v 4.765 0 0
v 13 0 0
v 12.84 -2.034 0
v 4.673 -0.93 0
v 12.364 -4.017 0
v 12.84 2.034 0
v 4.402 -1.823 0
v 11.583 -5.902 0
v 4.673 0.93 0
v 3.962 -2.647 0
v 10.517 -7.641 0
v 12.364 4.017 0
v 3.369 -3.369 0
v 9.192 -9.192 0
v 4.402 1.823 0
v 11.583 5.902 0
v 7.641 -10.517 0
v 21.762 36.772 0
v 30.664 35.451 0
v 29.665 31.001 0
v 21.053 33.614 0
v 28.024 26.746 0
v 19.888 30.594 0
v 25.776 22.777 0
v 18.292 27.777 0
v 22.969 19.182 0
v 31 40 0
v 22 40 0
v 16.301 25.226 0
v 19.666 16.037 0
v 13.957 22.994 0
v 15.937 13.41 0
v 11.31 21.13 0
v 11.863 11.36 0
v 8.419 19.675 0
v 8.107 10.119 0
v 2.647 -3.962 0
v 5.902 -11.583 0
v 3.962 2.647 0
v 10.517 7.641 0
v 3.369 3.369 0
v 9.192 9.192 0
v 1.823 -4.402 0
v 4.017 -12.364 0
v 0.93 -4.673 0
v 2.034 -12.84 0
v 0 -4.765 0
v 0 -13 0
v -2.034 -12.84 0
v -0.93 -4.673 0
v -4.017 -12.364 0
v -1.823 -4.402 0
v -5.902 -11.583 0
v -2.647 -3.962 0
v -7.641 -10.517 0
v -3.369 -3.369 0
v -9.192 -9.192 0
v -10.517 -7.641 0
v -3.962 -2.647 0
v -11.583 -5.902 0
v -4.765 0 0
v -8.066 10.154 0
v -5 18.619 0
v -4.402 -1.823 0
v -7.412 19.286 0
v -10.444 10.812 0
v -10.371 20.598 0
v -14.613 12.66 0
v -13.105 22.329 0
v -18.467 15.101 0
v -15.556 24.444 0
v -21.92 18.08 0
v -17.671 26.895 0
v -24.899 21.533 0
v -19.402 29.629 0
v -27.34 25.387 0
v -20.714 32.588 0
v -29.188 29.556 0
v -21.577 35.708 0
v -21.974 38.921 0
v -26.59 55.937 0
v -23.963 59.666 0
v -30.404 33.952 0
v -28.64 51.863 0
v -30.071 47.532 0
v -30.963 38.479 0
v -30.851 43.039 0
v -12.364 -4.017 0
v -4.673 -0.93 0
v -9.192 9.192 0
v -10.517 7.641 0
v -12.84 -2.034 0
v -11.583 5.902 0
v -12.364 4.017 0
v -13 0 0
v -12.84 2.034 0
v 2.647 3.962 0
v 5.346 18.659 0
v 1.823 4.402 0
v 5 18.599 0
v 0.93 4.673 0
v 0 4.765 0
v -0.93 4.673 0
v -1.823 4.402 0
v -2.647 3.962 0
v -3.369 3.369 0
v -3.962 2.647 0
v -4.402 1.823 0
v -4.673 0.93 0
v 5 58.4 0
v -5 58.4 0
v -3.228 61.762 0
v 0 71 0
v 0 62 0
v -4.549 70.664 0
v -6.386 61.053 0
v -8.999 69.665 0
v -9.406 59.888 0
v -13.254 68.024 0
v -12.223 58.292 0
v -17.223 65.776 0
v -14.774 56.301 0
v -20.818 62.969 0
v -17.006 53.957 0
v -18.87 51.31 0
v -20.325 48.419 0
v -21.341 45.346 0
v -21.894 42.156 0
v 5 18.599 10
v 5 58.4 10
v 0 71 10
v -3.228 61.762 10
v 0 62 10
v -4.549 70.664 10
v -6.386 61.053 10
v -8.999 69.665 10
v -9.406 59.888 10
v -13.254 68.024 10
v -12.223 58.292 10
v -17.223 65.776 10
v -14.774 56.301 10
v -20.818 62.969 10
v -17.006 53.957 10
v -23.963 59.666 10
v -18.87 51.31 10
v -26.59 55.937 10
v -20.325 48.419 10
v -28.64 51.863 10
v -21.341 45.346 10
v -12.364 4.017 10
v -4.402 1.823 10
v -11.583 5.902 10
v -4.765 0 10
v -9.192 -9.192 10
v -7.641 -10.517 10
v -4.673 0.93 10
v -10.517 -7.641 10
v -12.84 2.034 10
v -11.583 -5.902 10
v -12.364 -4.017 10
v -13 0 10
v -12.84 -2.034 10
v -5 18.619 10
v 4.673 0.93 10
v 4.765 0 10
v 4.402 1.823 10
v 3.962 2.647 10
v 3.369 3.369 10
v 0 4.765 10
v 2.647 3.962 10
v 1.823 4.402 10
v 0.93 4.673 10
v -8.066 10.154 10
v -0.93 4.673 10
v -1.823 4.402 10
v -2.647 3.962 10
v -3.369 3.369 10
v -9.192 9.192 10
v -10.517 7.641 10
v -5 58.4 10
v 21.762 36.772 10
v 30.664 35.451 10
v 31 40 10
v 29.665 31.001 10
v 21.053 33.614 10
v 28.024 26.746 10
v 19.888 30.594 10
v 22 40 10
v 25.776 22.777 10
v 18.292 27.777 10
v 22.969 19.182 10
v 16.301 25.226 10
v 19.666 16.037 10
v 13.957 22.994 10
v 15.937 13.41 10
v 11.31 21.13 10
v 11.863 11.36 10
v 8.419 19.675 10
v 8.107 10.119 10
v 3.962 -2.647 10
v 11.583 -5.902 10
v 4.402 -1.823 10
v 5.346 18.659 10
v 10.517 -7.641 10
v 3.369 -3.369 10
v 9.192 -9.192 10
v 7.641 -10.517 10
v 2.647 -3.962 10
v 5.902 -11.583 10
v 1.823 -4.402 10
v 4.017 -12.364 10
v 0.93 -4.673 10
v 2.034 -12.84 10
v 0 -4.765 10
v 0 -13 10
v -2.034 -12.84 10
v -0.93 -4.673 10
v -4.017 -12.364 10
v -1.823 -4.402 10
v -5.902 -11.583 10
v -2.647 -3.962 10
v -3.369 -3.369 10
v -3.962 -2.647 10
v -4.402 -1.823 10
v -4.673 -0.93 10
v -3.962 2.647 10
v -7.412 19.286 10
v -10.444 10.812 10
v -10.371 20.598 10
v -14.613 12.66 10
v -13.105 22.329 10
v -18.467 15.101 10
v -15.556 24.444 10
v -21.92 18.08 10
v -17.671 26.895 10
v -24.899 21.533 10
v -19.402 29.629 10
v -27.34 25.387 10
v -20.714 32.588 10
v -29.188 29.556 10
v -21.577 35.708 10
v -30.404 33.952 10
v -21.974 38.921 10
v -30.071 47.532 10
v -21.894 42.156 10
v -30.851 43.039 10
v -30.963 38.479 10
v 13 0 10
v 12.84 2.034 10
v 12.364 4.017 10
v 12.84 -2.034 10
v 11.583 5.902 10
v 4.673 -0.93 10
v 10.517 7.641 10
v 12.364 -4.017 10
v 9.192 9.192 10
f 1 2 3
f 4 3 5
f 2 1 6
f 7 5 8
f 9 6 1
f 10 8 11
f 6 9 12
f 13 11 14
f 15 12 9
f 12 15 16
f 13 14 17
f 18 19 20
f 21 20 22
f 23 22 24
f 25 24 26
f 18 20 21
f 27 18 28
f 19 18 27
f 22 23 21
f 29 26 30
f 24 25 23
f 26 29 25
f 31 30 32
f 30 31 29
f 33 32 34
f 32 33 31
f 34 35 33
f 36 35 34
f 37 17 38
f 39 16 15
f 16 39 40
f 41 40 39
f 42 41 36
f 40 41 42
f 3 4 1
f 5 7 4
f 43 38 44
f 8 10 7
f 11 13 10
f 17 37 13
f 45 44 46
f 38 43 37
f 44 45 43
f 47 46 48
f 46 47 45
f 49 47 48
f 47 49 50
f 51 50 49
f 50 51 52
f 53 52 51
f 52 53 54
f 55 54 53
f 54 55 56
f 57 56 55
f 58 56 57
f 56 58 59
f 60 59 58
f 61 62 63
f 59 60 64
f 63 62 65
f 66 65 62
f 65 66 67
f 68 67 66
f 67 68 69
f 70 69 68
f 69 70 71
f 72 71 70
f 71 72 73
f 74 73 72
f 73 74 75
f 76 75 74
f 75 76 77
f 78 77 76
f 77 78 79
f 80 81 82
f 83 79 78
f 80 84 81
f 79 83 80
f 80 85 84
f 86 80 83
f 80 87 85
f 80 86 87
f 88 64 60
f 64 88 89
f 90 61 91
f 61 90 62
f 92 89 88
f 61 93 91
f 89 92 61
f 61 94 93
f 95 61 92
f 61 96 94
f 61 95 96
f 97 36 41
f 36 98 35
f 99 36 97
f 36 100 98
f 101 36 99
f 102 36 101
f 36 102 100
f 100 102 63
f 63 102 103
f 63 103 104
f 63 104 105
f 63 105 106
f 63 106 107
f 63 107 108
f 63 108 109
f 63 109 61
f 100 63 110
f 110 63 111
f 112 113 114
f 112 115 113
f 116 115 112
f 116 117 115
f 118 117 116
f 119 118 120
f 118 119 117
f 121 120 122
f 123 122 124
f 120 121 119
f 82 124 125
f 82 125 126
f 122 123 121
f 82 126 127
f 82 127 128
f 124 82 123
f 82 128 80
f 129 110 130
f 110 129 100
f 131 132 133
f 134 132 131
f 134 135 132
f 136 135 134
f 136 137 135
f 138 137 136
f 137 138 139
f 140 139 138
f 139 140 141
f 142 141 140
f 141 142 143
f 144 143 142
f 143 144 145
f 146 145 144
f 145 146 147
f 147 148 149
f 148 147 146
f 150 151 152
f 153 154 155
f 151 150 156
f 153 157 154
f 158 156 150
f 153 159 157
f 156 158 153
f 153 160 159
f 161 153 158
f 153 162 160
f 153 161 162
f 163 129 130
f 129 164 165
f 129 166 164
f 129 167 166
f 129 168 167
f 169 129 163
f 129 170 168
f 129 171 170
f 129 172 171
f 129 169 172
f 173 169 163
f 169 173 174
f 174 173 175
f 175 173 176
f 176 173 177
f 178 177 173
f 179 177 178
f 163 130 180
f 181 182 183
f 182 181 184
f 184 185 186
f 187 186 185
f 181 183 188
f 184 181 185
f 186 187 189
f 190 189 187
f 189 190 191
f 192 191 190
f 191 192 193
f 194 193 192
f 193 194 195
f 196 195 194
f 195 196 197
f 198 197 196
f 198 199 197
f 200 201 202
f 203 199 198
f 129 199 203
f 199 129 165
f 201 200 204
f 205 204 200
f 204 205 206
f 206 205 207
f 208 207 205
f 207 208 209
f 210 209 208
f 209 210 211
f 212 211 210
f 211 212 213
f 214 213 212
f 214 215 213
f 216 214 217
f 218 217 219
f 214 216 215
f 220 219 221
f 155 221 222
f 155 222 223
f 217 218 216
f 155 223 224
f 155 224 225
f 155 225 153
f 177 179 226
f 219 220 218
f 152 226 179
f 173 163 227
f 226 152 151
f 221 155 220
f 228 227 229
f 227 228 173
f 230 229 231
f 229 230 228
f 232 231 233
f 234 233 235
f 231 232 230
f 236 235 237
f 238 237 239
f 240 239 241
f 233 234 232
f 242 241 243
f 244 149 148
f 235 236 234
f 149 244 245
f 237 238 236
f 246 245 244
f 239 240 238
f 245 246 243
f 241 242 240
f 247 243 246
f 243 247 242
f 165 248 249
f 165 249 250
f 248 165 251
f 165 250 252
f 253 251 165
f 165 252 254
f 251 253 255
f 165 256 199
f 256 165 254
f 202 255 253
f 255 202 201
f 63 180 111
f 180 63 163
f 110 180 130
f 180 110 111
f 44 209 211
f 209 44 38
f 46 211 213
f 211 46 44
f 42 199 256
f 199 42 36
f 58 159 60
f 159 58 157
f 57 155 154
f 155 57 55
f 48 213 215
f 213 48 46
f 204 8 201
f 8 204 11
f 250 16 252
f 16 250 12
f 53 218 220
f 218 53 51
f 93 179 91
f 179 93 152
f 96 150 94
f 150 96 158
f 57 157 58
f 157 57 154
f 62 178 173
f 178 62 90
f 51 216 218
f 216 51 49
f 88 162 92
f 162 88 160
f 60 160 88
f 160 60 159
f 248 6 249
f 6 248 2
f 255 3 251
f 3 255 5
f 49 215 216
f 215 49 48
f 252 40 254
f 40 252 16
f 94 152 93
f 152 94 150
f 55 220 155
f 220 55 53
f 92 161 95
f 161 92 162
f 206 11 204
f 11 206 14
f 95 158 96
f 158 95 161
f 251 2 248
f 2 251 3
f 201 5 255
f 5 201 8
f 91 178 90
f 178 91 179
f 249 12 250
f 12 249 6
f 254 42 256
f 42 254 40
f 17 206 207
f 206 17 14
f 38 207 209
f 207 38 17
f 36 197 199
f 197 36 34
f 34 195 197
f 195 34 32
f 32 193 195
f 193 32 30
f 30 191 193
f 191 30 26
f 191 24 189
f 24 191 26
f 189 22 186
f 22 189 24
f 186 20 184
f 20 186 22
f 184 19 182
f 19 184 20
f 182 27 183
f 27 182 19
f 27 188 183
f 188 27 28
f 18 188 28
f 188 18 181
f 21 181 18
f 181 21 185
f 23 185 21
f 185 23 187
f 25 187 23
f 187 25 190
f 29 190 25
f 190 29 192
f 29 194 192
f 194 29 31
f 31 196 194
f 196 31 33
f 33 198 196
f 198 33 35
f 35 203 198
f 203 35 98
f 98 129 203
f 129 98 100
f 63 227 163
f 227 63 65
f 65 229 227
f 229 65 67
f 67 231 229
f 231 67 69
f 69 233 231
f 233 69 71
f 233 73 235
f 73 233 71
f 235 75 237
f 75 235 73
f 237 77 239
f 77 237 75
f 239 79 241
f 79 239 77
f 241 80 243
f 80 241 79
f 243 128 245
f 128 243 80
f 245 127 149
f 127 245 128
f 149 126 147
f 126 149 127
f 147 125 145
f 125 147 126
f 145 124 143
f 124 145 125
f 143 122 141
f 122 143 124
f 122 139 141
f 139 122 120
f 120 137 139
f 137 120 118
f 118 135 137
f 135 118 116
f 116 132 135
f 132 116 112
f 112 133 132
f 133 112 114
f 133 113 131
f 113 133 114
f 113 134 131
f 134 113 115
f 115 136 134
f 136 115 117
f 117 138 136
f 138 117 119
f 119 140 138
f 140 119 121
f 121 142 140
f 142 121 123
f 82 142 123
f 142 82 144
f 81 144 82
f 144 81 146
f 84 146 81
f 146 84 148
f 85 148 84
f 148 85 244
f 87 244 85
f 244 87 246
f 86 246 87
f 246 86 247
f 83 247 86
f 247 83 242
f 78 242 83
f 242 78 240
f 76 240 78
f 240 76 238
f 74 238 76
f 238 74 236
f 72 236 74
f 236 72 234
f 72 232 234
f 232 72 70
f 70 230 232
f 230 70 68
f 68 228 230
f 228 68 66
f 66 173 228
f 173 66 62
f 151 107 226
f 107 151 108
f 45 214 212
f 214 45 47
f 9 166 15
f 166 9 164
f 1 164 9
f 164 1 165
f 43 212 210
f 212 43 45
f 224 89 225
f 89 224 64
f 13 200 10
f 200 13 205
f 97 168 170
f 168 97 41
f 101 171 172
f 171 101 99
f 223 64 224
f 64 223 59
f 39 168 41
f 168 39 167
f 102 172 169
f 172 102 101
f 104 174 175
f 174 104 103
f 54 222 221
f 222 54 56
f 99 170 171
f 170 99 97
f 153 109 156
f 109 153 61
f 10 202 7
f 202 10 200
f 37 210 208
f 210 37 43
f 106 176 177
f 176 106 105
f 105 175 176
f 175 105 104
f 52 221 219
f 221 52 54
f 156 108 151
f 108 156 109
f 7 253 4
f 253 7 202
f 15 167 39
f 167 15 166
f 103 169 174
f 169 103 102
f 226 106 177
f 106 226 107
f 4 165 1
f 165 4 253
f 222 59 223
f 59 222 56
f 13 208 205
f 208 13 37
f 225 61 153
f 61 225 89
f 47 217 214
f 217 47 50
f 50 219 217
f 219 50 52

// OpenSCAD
$fn = 32;

// ----------------------------------------------------------------------
// Hook: 80 mm shank into a 22 mm curl, 10 mm thick
// ----------------------------------------------------------------------

// --- parameters (mm) ---
shank_len = 80;           // shank length from the boss centre
shank_w = 10;             // shank width
boss_d = 26;              // boss diameter
bore_d = 9.53;            // boss bore
curl_in = 22;             // curl inner radius
curl_out = 31;            // curl outer radius
curl_sweep = 270;         // curl sweep angle
hook_t = 10;              // hook thickness

shank_profile = [[-5, 58.4], [5, 58.4], [5, 11], [-5, 11]];
boss_profile = [[13, 0], [12.84, 2.034], [12.364, 4.017], [11.583, 5.902], [10.517, 7.641], [9.192, 9.192], [7.641, 10.517], [5.902, 11.583], [4.017, 12.364], [2.034, 12.84], [0, 13], [-2.034, 12.84], [-4.017, 12.364], [-5.902, 11.583], [-7.641, 10.517], [-9.192, 9.192], [-10.517, 7.641], [-11.583, 5.902], [-12.364, 4.017], [-12.84, 2.034], [-13, 0], [-12.84, -2.034], [-12.364, -4.017], [-11.583, -5.902], [-10.517, -7.641], [-9.192, -9.192], [-7.641, -10.517], [-5.902, -11.583], [-4.017, -12.364], [-2.034, -12.84], [0, -13], [2.034, -12.84], [4.017, -12.364], [5.902, -11.583], [7.641, -10.517], [9.192, -9.192], [10.517, -7.641], [11.583, -5.902], [12.364, -4.017], [12.84, -2.034]];
curl_profile = [[0, 71], [-4.549, 70.664], [-8.999, 69.665], [-13.254, 68.024], [-17.223, 65.776], [-20.818, 62.969], [-23.963, 59.666], [-26.59, 55.937], [-28.64, 51.863], [-30.071, 47.532], [-30.851, 43.039], [-30.963, 38.479], [-30.404, 33.952], [-29.188, 29.556], [-27.34, 25.387], [-24.899, 21.533], [-21.92, 18.08], [-18.467, 15.101], [-14.613, 12.66], [-10.444, 10.812], [-6.048, 9.596], [-1.521, 9.037], [3.039, 9.149], [7.532, 9.929], [11.863, 11.36], [15.937, 13.41], [19.666, 16.037], [22.969, 19.182], [25.776, 22.777], [28.024, 26.746], [29.665, 31.001], [30.664, 35.451], [31, 40], [22, 40], [21.762, 36.772], [21.053, 33.614], [19.888, 30.594], [18.292, 27.777], [16.301, 25.226], [13.957, 22.994], [11.31, 21.13], [8.419, 19.675], [5.346, 18.659], [2.156, 18.106], [-1.079, 18.026], [-4.292, 18.423], [-7.412, 19.286], [-10.371, 20.598], [-13.105, 22.329], [-15.556, 24.444], [-17.671, 26.895], [-19.402, 29.629], [-20.714, 32.588], [-21.577, 35.708], [-21.974, 38.921], [-21.894, 42.156], [-21.341, 45.346], [-20.325, 48.419], [-18.87, 51.31], [-17.006, 53.957], [-14.774, 56.301], [-12.223, 58.292], [-9.406, 59.888], [-6.386, 61.053], [-3.228, 61.762], [0, 62]];

difference() {
  union() {
    /* three overlapping outlines: shank, boss and the smooth curl */
    linear_extrude(height = hook_t) polygon(shank_profile);
    linear_extrude(height = hook_t) polygon(boss_profile);
    linear_extrude(height = hook_t) polygon(curl_profile);
  }
  translate([0, 0, -2.5]) cylinder(h = hook_t + 5, d = bore_d);
}
